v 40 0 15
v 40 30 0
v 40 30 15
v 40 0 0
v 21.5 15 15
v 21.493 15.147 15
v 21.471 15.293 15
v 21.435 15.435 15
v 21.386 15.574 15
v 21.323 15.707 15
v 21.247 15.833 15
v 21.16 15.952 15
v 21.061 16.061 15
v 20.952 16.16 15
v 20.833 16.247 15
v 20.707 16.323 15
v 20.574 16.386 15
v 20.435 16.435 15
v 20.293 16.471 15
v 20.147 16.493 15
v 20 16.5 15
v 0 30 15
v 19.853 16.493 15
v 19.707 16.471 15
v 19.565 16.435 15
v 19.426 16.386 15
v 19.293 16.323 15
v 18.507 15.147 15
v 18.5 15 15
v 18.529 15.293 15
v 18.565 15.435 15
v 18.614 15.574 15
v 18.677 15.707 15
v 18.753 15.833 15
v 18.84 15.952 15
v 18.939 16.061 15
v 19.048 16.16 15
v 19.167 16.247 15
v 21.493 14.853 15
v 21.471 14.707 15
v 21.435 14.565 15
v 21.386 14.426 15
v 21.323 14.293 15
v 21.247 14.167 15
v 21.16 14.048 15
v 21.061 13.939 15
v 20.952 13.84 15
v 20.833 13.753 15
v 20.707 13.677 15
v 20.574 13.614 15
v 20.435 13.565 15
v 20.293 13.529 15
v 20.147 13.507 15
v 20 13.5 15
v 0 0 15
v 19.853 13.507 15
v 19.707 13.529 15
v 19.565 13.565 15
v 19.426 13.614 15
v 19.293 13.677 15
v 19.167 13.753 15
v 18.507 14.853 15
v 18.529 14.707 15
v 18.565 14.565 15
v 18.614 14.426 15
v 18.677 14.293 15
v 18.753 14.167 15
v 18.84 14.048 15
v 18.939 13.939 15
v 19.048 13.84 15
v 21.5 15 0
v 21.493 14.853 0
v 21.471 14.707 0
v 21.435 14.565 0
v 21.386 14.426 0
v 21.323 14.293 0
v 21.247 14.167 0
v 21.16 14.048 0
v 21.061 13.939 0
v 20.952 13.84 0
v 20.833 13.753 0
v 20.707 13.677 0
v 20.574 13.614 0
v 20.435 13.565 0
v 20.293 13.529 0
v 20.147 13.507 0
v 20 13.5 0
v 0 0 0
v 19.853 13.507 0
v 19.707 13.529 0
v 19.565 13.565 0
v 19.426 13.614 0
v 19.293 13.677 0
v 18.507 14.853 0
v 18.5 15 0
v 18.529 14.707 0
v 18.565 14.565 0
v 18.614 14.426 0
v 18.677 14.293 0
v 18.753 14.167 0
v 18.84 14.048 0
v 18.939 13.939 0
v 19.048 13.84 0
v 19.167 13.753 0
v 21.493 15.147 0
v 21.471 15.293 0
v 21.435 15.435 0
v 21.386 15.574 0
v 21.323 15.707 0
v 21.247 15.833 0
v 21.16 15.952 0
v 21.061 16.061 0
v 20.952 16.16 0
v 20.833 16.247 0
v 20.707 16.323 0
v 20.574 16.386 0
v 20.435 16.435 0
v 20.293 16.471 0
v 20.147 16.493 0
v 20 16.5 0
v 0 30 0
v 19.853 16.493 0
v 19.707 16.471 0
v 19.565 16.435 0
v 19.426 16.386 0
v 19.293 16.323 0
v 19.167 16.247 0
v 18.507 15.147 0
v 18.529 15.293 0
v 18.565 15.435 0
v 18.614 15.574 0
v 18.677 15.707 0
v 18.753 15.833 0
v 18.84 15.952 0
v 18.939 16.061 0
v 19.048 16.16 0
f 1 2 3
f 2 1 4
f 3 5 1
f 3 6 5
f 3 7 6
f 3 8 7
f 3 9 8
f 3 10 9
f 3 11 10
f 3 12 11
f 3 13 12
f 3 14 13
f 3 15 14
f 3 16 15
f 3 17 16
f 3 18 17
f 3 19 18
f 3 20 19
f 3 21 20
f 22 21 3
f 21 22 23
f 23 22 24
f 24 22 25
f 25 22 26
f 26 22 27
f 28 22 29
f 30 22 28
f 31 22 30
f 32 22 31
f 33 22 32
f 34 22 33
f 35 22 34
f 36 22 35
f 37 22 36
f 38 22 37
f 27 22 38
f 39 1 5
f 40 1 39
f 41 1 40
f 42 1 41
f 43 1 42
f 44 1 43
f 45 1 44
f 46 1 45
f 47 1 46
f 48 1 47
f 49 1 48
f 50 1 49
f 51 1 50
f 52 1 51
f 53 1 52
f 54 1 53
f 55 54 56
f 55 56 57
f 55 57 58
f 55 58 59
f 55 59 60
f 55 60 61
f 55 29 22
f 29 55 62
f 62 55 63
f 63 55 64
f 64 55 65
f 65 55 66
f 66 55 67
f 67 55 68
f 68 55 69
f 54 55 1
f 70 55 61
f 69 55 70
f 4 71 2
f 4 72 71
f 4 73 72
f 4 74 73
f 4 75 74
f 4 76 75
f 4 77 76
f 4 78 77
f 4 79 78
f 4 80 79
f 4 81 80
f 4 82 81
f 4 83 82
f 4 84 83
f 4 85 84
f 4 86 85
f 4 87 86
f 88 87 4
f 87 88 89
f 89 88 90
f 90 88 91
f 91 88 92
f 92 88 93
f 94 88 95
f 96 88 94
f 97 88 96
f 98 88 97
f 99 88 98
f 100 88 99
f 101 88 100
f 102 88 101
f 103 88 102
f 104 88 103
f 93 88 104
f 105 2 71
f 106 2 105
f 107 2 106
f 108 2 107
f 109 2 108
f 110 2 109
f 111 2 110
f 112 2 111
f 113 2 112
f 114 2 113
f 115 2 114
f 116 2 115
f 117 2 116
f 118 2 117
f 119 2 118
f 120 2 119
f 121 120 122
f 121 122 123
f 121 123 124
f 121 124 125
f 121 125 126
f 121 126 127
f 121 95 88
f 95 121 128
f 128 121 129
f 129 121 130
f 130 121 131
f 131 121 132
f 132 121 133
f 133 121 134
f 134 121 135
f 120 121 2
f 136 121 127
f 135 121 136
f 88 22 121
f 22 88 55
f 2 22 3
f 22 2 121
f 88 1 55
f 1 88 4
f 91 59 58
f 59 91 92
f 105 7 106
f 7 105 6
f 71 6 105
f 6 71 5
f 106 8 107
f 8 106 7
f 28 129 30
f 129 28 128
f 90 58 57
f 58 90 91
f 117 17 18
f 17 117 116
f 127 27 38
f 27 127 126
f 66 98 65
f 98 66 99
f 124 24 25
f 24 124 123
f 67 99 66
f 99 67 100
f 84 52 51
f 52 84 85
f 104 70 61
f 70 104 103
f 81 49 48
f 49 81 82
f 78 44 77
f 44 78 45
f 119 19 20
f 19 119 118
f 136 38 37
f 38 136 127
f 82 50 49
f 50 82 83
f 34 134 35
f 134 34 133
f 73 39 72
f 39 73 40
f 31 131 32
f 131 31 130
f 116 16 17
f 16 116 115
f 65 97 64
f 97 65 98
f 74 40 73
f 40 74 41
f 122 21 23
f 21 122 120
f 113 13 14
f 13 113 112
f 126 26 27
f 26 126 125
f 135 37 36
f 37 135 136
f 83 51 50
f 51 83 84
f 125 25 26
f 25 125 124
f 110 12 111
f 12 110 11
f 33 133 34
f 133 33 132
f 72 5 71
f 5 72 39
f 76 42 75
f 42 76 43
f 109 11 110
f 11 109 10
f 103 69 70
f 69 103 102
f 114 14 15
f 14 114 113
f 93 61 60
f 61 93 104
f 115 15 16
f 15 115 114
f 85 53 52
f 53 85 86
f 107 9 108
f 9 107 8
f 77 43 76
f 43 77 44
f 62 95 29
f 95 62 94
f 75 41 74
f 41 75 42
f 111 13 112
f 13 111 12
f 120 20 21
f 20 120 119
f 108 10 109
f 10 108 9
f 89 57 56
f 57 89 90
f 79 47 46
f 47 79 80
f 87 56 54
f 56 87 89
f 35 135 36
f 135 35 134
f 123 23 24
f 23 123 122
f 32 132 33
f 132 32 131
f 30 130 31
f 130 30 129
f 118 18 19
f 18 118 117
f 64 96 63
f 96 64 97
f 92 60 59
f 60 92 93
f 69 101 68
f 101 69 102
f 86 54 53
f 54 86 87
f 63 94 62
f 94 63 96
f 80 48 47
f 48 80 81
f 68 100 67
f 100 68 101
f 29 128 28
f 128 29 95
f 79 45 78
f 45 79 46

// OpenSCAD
// Exemplo: caixa 40x30x15 mm com furo central de 3 mm (igual aos furos de alinhamento do projeto)
$fn = 64;
difference() {
    cube([40, 30, 15]);
    translate([20, 15, -1]) cylinder(d = 3, h = 17);
}
